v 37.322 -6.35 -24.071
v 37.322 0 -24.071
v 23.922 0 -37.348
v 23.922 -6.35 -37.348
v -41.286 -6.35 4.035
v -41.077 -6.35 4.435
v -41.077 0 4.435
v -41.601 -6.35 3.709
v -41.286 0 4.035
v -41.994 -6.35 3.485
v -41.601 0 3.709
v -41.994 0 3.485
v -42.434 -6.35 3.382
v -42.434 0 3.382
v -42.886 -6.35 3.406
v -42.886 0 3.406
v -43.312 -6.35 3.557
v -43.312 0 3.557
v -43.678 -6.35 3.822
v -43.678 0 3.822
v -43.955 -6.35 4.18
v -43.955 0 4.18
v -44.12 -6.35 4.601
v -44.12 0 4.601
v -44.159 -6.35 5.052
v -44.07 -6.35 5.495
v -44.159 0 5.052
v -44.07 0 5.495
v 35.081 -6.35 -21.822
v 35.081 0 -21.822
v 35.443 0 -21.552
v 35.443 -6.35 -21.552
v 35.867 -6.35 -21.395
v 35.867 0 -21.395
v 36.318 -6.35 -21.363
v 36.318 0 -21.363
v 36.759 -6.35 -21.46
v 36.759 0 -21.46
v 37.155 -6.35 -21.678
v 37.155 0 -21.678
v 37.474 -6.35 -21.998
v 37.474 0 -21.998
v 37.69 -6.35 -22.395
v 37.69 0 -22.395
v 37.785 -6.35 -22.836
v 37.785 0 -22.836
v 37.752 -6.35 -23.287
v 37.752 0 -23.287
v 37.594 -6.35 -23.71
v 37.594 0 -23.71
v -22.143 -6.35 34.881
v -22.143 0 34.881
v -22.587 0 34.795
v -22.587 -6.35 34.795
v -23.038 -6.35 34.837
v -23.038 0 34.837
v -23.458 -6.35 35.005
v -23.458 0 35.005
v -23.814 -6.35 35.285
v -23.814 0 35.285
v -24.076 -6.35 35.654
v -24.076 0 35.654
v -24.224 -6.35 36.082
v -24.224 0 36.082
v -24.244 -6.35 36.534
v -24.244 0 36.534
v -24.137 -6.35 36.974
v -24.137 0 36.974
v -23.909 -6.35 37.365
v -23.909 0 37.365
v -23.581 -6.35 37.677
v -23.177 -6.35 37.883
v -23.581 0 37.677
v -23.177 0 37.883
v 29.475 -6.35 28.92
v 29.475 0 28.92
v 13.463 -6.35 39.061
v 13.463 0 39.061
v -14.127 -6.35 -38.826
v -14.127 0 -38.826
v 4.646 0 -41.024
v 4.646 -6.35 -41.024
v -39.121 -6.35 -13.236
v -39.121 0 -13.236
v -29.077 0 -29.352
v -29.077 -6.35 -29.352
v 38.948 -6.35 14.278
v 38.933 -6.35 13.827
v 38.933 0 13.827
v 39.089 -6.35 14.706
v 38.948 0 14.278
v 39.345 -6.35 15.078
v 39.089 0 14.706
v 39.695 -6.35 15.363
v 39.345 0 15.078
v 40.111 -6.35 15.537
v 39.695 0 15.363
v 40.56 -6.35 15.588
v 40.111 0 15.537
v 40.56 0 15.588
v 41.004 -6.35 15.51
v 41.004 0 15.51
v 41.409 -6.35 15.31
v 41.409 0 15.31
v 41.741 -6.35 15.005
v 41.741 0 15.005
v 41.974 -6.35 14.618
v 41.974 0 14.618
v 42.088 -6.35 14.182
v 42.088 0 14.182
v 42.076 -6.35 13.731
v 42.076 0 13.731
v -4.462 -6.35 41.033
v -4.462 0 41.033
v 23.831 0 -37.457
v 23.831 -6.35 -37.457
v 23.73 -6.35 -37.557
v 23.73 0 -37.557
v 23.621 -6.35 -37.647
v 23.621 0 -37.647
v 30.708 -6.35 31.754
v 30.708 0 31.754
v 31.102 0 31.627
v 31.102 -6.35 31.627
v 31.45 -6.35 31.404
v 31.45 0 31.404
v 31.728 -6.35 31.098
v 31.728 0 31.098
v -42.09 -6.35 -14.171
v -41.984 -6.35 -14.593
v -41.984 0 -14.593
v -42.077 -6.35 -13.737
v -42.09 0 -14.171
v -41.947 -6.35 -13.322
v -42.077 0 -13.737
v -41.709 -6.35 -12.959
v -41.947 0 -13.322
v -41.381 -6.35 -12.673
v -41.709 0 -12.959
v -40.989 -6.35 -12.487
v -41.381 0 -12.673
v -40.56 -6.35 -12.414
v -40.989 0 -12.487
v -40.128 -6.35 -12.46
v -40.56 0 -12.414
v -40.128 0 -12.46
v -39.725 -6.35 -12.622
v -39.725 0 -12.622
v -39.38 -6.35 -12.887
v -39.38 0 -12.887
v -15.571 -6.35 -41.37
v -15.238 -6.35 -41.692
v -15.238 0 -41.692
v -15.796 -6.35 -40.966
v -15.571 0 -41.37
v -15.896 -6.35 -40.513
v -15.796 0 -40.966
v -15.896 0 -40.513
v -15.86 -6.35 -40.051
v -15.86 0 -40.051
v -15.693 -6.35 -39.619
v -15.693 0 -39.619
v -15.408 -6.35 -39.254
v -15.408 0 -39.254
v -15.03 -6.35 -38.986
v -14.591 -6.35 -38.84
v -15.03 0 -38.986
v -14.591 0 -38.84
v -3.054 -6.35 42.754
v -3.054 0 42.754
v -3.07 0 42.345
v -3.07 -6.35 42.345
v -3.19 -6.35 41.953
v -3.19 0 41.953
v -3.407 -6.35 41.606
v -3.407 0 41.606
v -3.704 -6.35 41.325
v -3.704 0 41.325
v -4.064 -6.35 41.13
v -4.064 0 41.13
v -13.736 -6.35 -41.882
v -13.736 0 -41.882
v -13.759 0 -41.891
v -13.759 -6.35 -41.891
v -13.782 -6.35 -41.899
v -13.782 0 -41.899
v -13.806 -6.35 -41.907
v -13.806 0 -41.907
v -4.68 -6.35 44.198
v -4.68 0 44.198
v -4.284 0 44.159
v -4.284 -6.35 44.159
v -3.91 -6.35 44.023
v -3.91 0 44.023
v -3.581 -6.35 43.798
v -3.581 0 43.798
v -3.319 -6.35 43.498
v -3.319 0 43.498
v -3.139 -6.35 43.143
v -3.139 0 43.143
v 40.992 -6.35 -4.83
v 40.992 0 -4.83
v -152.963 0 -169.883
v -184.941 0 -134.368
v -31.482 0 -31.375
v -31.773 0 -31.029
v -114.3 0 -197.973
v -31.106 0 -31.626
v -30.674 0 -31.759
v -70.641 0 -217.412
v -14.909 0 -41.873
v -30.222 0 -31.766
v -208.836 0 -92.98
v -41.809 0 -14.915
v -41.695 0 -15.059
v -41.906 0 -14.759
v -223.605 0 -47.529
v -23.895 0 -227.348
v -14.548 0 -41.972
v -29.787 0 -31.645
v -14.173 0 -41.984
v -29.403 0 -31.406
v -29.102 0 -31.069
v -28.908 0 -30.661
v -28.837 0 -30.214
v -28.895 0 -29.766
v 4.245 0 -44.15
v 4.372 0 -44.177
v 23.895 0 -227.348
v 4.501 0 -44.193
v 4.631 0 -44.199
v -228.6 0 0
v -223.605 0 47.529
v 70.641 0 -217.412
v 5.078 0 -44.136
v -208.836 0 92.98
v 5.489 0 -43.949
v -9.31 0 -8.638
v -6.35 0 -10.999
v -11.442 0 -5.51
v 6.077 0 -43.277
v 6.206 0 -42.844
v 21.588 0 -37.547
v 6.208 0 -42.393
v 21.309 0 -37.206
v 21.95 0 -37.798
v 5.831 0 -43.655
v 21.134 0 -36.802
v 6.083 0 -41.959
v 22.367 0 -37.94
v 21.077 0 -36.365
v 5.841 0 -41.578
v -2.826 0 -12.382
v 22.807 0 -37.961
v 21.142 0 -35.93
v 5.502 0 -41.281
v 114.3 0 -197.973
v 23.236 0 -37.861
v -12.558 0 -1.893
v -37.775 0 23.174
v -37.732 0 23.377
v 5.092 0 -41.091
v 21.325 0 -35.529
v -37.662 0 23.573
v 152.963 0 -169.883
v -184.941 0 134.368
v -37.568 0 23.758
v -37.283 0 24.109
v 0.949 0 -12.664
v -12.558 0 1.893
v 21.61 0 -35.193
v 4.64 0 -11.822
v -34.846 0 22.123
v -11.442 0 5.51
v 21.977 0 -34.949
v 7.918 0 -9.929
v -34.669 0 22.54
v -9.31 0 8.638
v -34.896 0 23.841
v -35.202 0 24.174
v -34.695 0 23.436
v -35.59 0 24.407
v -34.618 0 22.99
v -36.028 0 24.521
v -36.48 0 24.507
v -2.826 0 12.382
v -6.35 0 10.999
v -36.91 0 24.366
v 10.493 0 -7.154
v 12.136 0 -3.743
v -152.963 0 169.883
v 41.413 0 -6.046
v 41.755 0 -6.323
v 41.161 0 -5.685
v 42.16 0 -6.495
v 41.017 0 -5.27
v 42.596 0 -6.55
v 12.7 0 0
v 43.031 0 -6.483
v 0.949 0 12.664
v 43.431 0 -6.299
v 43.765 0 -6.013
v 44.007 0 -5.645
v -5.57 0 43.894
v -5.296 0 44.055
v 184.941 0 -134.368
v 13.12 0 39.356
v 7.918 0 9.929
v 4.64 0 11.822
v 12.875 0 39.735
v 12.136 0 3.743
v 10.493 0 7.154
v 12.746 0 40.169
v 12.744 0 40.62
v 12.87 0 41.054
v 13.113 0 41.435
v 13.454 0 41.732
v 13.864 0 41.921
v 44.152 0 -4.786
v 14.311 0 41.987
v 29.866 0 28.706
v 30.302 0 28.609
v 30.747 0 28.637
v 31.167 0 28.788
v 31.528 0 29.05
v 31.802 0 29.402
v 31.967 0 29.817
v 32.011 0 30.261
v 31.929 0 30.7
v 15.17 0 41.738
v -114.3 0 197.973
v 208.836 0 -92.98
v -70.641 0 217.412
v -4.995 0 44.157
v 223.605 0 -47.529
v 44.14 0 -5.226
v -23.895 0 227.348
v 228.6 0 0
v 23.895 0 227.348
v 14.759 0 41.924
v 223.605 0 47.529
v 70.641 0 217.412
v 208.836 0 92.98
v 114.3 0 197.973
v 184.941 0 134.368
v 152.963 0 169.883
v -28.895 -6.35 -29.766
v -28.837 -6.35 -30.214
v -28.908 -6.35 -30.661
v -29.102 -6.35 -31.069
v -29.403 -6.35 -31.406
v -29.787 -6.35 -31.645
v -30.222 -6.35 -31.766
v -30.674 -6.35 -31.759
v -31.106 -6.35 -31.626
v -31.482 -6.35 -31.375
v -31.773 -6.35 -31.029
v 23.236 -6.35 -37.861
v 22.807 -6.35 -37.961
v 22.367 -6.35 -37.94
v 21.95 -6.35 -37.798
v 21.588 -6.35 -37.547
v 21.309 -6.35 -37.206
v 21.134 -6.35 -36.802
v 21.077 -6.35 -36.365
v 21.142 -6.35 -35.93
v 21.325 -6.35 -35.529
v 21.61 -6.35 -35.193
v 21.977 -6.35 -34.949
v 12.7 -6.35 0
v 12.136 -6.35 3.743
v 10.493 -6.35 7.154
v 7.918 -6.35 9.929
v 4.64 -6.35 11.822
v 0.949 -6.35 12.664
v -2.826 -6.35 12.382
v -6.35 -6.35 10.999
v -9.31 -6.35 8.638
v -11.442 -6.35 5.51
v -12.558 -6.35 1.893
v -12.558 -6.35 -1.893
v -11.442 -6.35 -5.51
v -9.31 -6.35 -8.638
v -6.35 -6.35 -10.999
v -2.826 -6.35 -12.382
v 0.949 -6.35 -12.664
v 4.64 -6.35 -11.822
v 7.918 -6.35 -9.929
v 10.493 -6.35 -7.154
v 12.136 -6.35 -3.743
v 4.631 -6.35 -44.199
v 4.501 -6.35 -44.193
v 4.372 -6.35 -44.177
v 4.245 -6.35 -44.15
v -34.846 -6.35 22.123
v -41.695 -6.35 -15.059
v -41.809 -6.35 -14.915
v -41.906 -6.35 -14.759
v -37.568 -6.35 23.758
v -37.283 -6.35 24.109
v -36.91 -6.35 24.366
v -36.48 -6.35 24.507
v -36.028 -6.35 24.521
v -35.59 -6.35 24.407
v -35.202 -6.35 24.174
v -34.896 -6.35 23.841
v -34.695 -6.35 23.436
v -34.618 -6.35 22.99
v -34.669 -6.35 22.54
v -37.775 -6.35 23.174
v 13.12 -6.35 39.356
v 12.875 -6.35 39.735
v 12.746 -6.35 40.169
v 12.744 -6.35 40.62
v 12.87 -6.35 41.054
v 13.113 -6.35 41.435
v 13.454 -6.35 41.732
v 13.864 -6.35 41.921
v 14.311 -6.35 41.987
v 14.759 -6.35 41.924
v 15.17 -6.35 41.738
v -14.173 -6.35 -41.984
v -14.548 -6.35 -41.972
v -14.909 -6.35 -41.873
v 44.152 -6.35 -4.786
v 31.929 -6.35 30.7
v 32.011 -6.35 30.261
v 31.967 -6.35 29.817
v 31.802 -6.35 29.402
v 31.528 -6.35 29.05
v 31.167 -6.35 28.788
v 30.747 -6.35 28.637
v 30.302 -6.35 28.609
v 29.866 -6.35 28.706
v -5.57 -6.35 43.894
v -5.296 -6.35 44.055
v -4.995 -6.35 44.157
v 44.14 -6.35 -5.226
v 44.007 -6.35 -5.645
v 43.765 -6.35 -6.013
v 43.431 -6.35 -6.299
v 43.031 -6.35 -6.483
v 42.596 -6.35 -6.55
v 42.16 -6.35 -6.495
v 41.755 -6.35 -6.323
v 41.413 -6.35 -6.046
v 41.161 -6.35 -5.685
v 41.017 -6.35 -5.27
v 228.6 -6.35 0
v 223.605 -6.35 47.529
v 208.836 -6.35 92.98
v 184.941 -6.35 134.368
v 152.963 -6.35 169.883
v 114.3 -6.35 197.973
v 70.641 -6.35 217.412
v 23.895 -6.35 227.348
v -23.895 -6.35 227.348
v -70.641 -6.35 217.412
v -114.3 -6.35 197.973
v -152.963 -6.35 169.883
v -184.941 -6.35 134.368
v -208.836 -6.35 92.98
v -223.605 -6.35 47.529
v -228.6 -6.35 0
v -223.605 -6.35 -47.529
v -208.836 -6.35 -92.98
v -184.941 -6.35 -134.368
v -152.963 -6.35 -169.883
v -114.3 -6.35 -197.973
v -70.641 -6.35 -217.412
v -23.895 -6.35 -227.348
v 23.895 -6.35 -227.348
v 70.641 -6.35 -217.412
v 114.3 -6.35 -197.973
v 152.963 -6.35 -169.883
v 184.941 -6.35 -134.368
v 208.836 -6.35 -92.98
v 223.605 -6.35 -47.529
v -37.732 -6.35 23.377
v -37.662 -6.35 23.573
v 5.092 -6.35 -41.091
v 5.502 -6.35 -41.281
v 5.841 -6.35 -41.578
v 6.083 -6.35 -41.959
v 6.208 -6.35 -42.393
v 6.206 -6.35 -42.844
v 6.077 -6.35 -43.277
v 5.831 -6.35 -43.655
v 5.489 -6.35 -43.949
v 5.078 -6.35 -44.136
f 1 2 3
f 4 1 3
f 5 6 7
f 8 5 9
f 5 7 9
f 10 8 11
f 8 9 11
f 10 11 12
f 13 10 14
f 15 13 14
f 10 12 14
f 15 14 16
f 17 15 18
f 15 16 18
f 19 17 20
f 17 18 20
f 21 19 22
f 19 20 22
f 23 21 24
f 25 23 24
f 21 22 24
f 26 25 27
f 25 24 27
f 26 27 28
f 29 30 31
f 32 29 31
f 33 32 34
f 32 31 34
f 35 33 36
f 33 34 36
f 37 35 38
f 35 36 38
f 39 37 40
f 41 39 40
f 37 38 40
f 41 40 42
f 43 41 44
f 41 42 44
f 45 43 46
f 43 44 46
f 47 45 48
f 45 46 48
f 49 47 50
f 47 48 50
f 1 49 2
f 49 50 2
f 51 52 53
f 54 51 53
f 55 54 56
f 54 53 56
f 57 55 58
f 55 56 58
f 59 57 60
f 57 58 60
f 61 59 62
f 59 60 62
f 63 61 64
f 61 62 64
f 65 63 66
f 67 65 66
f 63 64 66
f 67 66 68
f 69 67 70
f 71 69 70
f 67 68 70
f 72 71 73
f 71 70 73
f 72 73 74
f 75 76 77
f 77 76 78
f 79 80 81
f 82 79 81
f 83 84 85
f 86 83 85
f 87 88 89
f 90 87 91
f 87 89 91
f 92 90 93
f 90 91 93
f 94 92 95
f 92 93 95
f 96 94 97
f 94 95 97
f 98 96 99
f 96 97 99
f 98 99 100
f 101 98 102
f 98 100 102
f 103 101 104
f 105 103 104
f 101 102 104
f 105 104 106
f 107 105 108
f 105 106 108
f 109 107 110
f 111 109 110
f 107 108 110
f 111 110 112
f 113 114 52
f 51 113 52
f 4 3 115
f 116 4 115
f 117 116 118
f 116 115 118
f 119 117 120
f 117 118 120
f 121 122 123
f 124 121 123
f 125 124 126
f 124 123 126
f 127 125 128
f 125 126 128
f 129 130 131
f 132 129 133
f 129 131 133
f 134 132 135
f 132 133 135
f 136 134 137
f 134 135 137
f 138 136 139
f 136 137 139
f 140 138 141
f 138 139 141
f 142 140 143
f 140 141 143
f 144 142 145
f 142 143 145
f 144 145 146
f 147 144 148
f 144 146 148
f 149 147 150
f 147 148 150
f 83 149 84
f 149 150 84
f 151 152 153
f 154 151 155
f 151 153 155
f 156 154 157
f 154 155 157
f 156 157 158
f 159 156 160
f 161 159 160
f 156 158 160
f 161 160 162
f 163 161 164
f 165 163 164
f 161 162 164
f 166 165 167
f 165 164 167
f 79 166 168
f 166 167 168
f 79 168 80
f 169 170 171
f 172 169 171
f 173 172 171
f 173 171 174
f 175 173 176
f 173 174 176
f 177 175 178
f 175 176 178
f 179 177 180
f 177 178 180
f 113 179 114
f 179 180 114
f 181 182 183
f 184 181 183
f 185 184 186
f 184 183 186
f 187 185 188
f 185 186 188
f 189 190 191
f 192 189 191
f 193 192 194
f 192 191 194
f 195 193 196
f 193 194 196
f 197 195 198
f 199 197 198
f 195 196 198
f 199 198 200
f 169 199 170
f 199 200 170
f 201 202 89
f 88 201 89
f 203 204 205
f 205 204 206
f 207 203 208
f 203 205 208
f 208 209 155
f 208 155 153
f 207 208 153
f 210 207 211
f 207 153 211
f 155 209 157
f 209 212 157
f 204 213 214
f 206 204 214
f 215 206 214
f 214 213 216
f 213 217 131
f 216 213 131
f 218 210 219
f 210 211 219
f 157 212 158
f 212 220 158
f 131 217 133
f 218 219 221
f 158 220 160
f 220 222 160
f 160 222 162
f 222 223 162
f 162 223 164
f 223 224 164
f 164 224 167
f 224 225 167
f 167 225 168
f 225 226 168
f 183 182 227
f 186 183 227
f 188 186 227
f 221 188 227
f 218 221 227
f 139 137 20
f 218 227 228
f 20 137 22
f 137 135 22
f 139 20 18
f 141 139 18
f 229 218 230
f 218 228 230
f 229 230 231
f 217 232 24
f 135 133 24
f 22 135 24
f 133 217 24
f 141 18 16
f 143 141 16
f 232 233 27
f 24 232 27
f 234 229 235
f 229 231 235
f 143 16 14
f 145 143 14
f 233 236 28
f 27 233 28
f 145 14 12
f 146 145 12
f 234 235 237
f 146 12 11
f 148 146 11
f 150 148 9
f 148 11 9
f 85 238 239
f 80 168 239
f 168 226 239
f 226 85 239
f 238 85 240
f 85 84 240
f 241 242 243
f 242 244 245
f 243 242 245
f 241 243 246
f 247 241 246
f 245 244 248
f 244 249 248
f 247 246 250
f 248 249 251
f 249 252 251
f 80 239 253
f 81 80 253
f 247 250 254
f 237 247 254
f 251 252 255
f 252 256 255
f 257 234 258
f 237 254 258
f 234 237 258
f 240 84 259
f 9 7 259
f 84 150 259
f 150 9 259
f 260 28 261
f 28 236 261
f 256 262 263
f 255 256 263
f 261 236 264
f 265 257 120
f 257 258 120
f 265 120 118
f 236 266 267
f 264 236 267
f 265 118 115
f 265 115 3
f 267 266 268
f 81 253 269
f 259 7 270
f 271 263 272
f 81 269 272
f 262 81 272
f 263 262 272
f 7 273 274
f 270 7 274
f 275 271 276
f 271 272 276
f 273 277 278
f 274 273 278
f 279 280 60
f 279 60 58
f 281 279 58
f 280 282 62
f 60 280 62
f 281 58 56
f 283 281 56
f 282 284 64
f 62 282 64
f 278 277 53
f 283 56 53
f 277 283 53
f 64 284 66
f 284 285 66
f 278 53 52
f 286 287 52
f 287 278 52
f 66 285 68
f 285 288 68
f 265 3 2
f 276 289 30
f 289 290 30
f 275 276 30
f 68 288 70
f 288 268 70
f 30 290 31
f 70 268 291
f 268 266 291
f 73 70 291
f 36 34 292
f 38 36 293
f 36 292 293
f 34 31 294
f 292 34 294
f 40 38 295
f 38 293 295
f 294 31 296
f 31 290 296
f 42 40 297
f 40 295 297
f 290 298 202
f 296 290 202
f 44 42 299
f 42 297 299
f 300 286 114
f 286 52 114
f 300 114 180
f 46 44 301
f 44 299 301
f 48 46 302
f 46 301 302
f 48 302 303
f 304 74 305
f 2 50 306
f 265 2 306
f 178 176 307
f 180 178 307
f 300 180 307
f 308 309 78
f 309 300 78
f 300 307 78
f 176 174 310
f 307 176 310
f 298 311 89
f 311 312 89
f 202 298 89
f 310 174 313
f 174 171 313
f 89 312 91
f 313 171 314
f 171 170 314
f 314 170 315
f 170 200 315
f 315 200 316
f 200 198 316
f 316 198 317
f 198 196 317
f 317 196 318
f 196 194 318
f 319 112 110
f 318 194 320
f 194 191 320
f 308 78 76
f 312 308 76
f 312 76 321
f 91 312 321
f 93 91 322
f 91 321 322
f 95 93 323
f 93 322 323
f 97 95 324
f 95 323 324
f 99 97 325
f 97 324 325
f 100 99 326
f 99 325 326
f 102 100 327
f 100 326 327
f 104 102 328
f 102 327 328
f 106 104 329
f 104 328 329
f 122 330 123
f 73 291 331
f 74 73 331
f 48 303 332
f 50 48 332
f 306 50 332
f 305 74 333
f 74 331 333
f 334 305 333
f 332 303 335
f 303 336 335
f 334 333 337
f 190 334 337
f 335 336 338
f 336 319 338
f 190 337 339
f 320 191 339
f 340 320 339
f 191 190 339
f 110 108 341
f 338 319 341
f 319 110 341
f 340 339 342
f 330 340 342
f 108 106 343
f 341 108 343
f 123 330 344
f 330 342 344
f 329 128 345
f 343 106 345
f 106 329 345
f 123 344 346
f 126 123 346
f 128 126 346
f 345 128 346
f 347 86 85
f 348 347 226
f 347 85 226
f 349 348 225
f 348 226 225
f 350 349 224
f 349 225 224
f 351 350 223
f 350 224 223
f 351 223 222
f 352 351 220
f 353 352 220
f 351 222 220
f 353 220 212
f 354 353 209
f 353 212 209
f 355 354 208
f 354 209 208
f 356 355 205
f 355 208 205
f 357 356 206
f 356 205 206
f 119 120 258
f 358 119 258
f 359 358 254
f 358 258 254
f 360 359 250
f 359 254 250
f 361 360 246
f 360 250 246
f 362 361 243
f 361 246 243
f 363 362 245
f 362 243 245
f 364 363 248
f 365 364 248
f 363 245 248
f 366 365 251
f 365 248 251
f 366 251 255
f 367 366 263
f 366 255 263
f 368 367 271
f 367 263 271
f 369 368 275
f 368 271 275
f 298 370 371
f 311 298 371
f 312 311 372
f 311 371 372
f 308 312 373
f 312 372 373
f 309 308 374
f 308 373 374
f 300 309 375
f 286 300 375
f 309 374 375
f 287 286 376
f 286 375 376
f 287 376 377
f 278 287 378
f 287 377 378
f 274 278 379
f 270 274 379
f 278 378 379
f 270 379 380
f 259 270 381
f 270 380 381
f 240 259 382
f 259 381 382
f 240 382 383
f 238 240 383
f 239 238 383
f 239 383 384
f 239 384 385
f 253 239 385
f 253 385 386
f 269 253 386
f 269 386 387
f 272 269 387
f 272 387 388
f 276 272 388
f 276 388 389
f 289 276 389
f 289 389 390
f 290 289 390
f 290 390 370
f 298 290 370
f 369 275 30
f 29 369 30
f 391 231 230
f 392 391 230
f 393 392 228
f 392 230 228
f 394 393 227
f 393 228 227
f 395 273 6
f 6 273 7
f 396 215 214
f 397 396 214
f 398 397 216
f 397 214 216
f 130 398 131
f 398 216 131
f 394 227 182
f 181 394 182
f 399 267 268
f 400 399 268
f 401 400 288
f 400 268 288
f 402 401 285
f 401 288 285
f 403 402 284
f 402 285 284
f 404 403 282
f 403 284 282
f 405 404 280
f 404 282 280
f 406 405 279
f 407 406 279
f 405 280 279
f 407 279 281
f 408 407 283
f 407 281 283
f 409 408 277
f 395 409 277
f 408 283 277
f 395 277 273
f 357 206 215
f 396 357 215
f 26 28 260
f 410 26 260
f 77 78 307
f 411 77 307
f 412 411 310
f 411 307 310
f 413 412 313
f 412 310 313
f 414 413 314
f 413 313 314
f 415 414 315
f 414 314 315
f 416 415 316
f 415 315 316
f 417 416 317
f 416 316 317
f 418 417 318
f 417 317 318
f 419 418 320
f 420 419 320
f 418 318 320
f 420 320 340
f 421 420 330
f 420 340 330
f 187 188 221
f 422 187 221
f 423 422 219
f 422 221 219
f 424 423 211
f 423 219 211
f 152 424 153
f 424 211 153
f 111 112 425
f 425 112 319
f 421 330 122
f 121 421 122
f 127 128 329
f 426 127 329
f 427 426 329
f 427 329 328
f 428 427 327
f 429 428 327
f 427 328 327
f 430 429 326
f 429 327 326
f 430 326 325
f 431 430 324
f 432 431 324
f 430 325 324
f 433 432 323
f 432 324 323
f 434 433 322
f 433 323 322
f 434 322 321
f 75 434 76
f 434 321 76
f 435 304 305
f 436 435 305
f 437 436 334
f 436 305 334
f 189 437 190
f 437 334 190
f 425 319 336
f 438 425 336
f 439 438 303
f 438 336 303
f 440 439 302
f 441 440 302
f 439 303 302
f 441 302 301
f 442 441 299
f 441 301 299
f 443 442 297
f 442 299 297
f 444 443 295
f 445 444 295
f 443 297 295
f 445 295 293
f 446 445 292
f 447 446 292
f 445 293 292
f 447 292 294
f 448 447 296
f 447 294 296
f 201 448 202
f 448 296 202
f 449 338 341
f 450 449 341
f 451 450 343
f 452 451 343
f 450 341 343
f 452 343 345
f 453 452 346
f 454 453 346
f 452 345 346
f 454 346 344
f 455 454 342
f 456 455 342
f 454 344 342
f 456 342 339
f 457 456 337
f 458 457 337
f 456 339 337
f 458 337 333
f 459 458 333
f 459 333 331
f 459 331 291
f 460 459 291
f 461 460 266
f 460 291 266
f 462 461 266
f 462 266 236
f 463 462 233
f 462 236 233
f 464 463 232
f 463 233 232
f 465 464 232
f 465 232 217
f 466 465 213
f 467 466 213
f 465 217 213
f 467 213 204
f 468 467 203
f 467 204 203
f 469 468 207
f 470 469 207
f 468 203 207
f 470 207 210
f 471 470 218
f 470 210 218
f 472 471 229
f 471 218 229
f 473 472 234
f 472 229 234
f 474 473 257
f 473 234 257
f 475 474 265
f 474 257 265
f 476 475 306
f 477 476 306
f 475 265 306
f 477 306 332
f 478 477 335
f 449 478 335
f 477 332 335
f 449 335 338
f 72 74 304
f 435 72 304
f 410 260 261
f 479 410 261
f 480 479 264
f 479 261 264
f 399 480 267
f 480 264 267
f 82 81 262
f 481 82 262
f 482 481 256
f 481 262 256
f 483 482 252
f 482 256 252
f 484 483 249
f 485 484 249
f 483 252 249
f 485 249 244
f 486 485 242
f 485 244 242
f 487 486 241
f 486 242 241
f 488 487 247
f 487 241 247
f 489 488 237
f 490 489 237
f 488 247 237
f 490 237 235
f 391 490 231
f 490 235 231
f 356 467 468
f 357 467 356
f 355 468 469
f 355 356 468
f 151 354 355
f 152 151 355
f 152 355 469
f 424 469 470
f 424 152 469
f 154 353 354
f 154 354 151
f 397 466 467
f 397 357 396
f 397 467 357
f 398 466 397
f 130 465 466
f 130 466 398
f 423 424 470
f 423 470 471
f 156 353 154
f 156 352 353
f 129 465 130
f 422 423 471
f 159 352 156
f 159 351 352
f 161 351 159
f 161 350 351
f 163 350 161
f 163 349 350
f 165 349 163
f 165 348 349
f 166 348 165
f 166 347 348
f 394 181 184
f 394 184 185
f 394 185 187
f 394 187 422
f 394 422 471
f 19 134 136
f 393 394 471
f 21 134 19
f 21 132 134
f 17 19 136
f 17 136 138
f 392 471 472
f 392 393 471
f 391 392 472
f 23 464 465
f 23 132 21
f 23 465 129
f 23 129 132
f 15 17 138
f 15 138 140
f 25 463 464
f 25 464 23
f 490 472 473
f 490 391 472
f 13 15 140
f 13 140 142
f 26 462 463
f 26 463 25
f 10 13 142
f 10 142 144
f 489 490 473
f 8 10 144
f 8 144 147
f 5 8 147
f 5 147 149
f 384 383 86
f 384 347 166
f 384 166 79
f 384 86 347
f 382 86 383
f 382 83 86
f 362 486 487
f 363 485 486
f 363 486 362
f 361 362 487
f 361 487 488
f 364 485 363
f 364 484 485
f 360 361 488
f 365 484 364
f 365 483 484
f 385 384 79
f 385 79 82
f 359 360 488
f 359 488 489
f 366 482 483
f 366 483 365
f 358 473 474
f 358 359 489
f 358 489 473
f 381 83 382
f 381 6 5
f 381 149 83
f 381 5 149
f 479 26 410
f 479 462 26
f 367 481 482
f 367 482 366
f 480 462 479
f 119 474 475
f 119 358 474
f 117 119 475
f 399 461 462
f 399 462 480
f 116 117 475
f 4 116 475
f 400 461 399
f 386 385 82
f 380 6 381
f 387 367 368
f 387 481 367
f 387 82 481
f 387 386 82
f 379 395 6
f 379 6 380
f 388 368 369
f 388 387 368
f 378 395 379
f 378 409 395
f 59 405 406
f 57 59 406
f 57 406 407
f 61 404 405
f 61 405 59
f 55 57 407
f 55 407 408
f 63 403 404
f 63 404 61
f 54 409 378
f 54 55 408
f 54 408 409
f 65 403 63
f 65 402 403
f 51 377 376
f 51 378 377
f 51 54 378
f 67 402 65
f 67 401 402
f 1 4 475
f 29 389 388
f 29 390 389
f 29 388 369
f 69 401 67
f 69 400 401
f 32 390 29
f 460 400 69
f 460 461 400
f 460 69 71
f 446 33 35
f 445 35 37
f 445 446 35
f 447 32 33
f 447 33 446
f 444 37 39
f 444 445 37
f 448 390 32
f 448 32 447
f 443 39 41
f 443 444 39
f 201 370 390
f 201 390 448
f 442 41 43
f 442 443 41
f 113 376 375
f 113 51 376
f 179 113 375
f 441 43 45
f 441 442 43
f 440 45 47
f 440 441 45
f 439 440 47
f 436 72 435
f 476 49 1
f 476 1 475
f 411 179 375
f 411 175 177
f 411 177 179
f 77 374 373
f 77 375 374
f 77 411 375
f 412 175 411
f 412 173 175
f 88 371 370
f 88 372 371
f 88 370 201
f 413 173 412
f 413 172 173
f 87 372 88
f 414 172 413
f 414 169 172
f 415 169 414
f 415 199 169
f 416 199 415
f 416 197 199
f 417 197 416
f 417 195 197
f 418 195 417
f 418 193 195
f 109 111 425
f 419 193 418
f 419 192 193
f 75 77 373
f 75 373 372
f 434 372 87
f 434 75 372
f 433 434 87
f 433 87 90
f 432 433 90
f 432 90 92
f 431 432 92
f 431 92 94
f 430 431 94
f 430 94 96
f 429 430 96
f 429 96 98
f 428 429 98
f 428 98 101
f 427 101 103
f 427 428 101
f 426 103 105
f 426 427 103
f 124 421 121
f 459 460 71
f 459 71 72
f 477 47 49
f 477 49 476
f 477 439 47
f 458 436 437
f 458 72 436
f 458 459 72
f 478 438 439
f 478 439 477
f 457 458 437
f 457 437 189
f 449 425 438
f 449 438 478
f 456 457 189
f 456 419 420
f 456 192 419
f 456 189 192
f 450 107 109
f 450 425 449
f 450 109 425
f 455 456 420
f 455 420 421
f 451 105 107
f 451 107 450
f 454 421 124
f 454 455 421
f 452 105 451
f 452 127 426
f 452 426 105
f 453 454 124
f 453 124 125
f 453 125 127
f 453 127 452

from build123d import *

# Parameters (mm, degrees)
F0_R     = 228.6
F1_DEPTH = 6.35
F3_DEPTH = 6.351
F4_R     = 12.7
F5_DEPTH = 6.351


# Not quite as in the source:
# - ends of sketch curves that miss each other by under 0.0002 mm in the source are joined


with BuildPart() as f1:
    # F0 (on Front) → F1 (new body)
    with BuildSketch(Plane.XZ):
        Circle(F0_R)
    extrude(amount=F1_DEPTH)

    # F2 (on face) → F3 (cut, through all)
    with BuildSketch(Plane(origin=(0, 0, 0), x_dir=(-1, 0, 0), z_dir=(0, 1, 0))):
        with BuildLine():
            Line((4.4618826202, 41.03312384), (22.1427530806, 34.8808349771))
            ThreePointArc((22.1427530806, 34.8808349771), (24.1653047772, 35.8628309135), (23.1774067066, 37.8825063297))
            Line((23.1774067066, 37.8825063297), (5.5701325615, 43.8941330325))
            Line((5.5701325615, 43.8941330325), (4.6801519701, 44.1979978468))
            ThreePointArc((4.6801519701, 44.1979978468), (3.5809145294, 43.7979774539), (3.0541190675, 42.7535519863))
            ThreePointArc((3.0541190675, 42.7535519863), (3.4066096848, 41.6058073542), (4.4618826202, 41.03312384))
        make_face()
        with BuildLine():
            Line((4.6801519701, 44.1979978468), (5.5701325615, 43.8941330325))
            ThreePointArc((5.5701325615, 43.8941330325), (5.1481595065, 44.1134796096), (4.6801519701, 44.1979978468))
        make_face()
        with BuildLine():
            Line((-31.727890274, 31.0981475896), (-30.7078696735, 31.753608073))
            ThreePointArc((-30.7078696735, 31.753608073), (-31.2829212175, 31.5270943199), (-31.727890274, 31.0981475896))
        make_face()
        with BuildLine():
            Line((-15.1702982711, 41.737979033), (-30.7078696735, 31.753608073))
            Line((-30.7078696735, 31.753608073), (-31.727890274, 31.0981475896))
            ThreePointArc((-31.727890274, 31.0981475896), (-31.5281772375, 29.050280341), (-29.4747442403, 28.9196721839))
            Line((-29.4747442403, 28.9196721839), (-13.4626581421, 39.061324038))
            ThreePointArc((-13.4626581421, 39.061324038), (-12.9781507091, 41.2534716), (-15.1702982711, 41.737979033))
        make_face()
        with BuildLine():
            Line((-40.992265014, -4.8302478058), (-38.9334293172, 13.8267433983))
            ThreePointArc((-38.9334293172, 13.8267433983), (-40.5597026781, 15.5876336173), (-42.0757424664, 13.7309907417))
            Line((-42.0757424664, 13.7309907417), (-44.151831017, -4.7859890094))
            ThreePointArc((-44.151831017, -4.7859890094), (-42.5964510469, -6.5502125075), (-40.992265014, -4.8302478058))
        make_face()
        with BuildLine():
            Line((34.8455227588, 22.1234679996), (41.0769142774, 4.4353792716))
            ThreePointArc((41.0769142774, 4.4353792716), (43.1041953835, 3.4664465633), (44.0697534768, 5.4953371086))
            Line((44.0697534768, 5.4953371086), (37.7754084063, 23.174174494))
            Line((37.7754084063, 23.174174494), (37.5676840132, 23.7576070393))
            ThreePointArc((37.5676840132, 23.7576070393), (35.3876634671, 24.3047338716), (34.8455227588, 22.1234679996))
        make_face()
        with BuildLine():
            Line((37.5676840132, 23.7576070393), (37.7754084063, 23.174174494))
            ThreePointArc((37.7754084063, 23.174174494), (37.7002728684, 23.4761185604), (37.5676840132, 23.7576070393))
        make_face()
        with BuildLine():
            Line((-23.6211183536, -37.6470325436), (-23.9224947466, -37.3484117712))
            ThreePointArc((-23.9224947466, -37.3484117712), (-23.7818274542, -37.5078355326), (-23.6211183536, -37.6470325436))
        make_face()
        with BuildLine():
            Line((-37.3220998756, -24.0713252866), (-23.9224947466, -37.3484117712))
            Line((-23.9224947466, -37.3484117712), (-23.6211183536, -37.6470325436))
            ThreePointArc((-23.6211183536, -37.6470325436), (-21.3089064889, -37.2063703199), (-21.9768545063, -34.9493031191))
            Line((-21.9768545063, -34.9493031191), (-35.0812263092, -21.8220953205))
            ThreePointArc((-35.0812263092, -21.8220953205), (-37.3262780755, -21.8262735204), (-37.3220998756, -24.0713252866))
        make_face()
        with BuildLine():
            Line((14.1274943747, -38.8257185152), (-4.6460917137, -41.0236705883))
            ThreePointArc((-4.6460917137, -41.0236705883), (-6.2226980939, -42.6185631758), (-4.6312320578, -44.1986283327))
            Line((-4.6312320578, -44.1986283327), (-4.2448360729, -44.1498861266))
            Line((-4.2448360729, -44.1498861266), (13.7359027682, -41.8816925861))
            Line((13.7359027682, -41.8816925861), (15.2375878216, -41.6922614193))
            ThreePointArc((15.2375878216, -41.6922614193), (15.7924641961, -39.8291626809), (14.1274943747, -38.8257185152))
        make_face()
        with BuildLine():
            Line((-4.2448360729, -44.1498861266), (-4.6312320578, -44.1986283327))
            ThreePointArc((-4.6312320578, -44.1986283327), (-4.4365336717, -44.1861513585), (-4.2448360729, -44.1498861266))
        make_face()
        with BuildLine():
            ThreePointArc((13.8057650277, -41.9070382349), (14.5475871245, -41.9723850949), (15.2375878216, -41.6922614193))
            Line((15.2375878216, -41.6922614193), (13.8057650277, -41.9070382349))
        make_face()
        with BuildLine():
            Line((13.8057650277, -41.9070382349), (15.2375878216, -41.6922614193))
            Line((15.2375878216, -41.6922614193), (13.7359027682, -41.8816925861))
            ThreePointArc((13.7359027682, -41.8816925861), (13.7706855601, -41.8947742862), (13.8057650277, -41.9070382349))
        make_face()
        with BuildLine():
            Line((39.1205111726, -13.2355457292), (29.0774053416, -29.3519750753))
            ThreePointArc((29.0774053416, -29.3519750753), (29.5860528198, -31.5394518473), (31.7731794636, -31.0293009591))
            Line((31.7731794636, -31.0293009591), (41.6947378015, -15.0590532006))
            Line((41.6947378015, -15.0590532006), (41.9843072327, -14.5929474337))
            ThreePointArc((41.9843072327, -14.5929474337), (41.1912924211, -12.5663543268), (39.1205111726, -13.2355457292))
        make_face()
        with BuildLine():
            Line((41.9843072327, -14.5929474337), (41.6947378015, -15.0590532006))
            ThreePointArc((41.6947378015, -15.0590532006), (41.8598142795, -14.8386066278), (41.9843072327, -14.5929474337))
        make_face()
    extrude(amount=-F3_DEPTH, mode=Mode.SUBTRACT)

    # F4 (on face) → F5 (cut, through all)
    with BuildSketch(Plane.XZ.offset(6.35)):
        Circle(F4_R)
    extrude(amount=-F5_DEPTH, mode=Mode.SUBTRACT)


solid = f1.part
